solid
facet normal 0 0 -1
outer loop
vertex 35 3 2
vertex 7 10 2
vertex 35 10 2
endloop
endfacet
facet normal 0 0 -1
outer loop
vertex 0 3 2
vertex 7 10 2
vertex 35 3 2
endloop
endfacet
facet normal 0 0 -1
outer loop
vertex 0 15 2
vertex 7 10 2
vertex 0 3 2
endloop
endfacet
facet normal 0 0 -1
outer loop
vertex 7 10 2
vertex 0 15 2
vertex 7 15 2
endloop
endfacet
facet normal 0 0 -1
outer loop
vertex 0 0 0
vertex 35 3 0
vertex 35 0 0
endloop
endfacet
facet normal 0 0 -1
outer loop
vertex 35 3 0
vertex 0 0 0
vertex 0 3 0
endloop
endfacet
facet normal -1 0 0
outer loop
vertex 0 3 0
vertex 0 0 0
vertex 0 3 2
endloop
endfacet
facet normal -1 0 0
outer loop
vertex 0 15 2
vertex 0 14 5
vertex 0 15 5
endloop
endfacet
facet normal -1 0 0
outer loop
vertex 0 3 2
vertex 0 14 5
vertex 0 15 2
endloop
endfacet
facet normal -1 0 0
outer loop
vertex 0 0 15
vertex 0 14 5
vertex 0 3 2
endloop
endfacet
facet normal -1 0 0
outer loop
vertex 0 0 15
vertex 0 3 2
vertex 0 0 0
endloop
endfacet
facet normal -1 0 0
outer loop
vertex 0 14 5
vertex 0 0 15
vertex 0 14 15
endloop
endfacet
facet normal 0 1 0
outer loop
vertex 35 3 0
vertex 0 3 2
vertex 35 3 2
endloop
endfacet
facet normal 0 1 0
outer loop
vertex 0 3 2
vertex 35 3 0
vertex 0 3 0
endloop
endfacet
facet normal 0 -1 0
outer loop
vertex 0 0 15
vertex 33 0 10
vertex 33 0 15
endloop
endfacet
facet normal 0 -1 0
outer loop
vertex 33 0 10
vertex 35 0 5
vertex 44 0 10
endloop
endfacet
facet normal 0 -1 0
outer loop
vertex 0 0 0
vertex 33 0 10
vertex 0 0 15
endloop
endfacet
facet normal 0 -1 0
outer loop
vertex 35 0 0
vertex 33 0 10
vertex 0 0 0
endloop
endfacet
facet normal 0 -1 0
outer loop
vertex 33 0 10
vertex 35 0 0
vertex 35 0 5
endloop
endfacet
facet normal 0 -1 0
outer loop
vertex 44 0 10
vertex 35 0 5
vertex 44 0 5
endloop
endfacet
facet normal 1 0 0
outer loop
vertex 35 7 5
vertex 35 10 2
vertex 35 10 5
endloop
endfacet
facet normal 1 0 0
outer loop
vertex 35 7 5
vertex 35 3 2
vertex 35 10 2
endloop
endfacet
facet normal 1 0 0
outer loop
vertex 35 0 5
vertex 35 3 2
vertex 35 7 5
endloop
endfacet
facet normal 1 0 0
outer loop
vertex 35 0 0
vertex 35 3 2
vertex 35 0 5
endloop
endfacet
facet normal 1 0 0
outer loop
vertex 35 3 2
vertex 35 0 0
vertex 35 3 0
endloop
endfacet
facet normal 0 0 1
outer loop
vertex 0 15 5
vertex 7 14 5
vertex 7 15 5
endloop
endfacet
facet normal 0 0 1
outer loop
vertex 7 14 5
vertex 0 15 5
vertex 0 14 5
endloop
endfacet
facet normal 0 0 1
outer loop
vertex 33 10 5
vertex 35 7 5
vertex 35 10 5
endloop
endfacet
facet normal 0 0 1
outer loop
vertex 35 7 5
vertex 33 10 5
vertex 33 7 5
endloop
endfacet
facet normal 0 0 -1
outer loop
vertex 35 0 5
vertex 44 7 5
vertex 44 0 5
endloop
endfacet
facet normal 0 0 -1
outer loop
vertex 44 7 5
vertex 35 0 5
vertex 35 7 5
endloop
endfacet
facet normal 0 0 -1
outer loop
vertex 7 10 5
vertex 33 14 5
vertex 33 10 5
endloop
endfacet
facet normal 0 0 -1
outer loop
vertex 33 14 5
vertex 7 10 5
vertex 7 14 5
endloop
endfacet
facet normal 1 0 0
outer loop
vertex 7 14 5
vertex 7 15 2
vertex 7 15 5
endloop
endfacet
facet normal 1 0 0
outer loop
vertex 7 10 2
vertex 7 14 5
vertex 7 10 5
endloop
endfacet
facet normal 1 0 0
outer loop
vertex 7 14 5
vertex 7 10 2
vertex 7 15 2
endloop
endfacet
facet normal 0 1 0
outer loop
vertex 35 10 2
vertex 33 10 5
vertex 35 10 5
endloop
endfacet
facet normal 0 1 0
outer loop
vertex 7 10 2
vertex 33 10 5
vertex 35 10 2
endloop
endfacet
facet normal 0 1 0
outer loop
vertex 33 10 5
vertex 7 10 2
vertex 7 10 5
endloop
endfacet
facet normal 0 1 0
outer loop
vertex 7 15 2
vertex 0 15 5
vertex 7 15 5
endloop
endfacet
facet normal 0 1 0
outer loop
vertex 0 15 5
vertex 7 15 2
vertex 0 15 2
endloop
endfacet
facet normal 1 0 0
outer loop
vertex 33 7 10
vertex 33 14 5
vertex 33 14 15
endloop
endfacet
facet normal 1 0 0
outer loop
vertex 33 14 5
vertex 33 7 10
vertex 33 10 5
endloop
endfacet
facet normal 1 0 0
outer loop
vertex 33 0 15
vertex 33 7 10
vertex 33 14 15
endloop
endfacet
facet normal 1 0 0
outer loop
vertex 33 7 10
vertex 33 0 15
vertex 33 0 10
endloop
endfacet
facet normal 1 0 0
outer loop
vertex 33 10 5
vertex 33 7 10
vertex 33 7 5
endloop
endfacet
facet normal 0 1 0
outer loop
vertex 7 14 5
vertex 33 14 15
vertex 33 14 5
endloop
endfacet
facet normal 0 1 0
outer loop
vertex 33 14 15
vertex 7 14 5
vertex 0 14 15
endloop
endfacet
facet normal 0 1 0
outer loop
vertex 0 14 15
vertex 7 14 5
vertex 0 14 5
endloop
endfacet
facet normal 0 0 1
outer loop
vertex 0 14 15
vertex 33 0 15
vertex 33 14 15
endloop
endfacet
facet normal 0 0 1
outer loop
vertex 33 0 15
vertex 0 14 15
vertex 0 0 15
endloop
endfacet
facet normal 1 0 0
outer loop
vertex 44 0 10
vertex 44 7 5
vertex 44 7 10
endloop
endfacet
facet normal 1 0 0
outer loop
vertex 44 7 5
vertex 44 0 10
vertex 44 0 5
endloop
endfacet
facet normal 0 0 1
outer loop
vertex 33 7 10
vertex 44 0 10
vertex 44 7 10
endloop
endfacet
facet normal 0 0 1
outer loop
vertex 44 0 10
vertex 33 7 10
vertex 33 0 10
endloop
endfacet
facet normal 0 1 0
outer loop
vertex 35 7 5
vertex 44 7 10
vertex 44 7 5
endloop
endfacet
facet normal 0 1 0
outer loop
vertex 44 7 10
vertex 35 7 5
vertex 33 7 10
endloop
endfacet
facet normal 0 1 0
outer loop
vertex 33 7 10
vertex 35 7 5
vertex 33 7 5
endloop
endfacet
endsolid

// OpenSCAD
translate([2.5, 1.5, 1.0]) color([0.43401891336511733, 0.7163457448050065, 0.3841301513333275]) cube([5, 3, 2], center=true);
translate([7.5, 1.5, 1.0]) color([0.33069552050314754, 0.6480049557775331, 0.6874717059379091]) cube([5, 3, 2], center=true);
translate([12.5, 1.5, 1.0]) color([0.14801928734251768, 0.93323205939552, 0.14750072005511716]) cube([5, 3, 2], center=true);
translate([17.5, 1.5, 1.0]) color([0.31607169754224296, 0.2088660889148145, 0.1868244368145192]) cube([5, 3, 2], center=true);
translate([22.5, 1.5, 1.0]) color([0.3491672112743387, 0.9834841816788549, 0.427290207198605]) cube([5, 3, 2], center=true);
translate([27.5, 1.5, 1.0]) color([0.49195852420878716, 0.7297831417632067, 0.7955834433152874]) cube([5, 3, 2], center=true);
translate([32.5, 1.5, 1.0]) color([0.43927203819181504, 0.2042687131951023, 0.709997013582239]) cube([5, 3, 2], center=true);
translate([3.5, 2.5, 3.5]) color([0.9058221085991531, 0.03327924187503195, 0.6331757983912308]) cube([7, 5, 3], center=true);
translate([10.5, 2.5, 3.5]) color([0.8710093735661795, 0.3636101637556439, 0.7431628081058981]) cube([7, 5, 3], center=true);
translate([17.5, 2.5, 3.5]) color([0.6774926049513658, 0.23306417175218364, 0.2975271762349214]) cube([7, 5, 3], center=true);
translate([24.5, 2.5, 3.5]) color([0.0866296567389645, 0.8688435220131177, 0.7514921149941085]) cube([7, 5, 3], center=true);
translate([31.5, 2.5, 3.5]) color([0.7714305883456576, 0.8829516943772963, 0.4114323292545551]) cube([7, 5, 3], center=true);
translate([3.5, 7.5, 3.5]) color([0.05394001775890156, 0.696805048854085, 0.6656296547984208]) cube([7, 5, 3], center=true);
translate([10.5, 7.5, 3.5]) color([0.6485122289860075, 0.5471816206705559, 0.7344166333532061]) cube([7, 5, 3], center=true);
translate([17.5, 7.5, 3.5]) color([0.4306045068871984, 0.45460236437769275, 0.25475221651879554]) cube([7, 5, 3], center=true);
translate([24.5, 7.5, 3.5]) color([0.47565246533915095, 0.3371942584654095, 0.04223511400675217]) cube([7, 5, 3], center=true);
translate([31.5, 7.5, 3.5]) color([0.05255331220371673, 0.34980223330761895, 0.2898096938030986]) cube([7, 5, 3], center=true);
translate([3.5, 12.5, 3.5]) color([0.007130057665757694, 0.06369015415518986, 0.42774457246440645]) cube([7, 5, 3], center=true);
translate([5.5, 3.5, 7.5]) color([0.22216650821772055, 0.6086379170158094, 0.557768500755667]) cube([11, 7, 5], center=true);
translate([16.5, 3.5, 7.5]) color([0.22097295115667703, 0.19284823789822858, 0.6083188139076446]) cube([11, 7, 5], center=true);
translate([27.5, 3.5, 7.5]) color([0.606354511401297, 0.08562053587131313, 0.31903016062772993]) cube([11, 7, 5], center=true);
translate([5.5, 10.5, 7.5]) color([0.53590115499306, 0.8934753784920533, 0.25549985489866966]) cube([11, 7, 5], center=true);
translate([16.5, 10.5, 7.5]) color([0.5219903070058861, 0.1901317713313112, 0.08011594570868696]) cube([11, 7, 5], center=true);
translate([27.5, 10.5, 7.5]) color([0.8699478397109702, 0.3457472114844995, 0.837290862214726]) cube([11, 7, 5], center=true);
translate([5.5, 3.5, 12.5]) color([0.25127706432840136, 0.7290260027021367, 0.3013213449137814]) cube([11, 7, 5], center=true);
translate([16.5, 3.5, 12.5]) color([0.5169005458056509, 0.38467176448284957, 0.4820846642847386]) cube([11, 7, 5], center=true);
translate([27.5, 3.5, 12.5]) color([0.8719757028853922, 0.2399620044566907, 0.3058147052987177]) cube([11, 7, 5], center=true);
translate([5.5, 10.5, 12.5]) color([0.5519737755681405, 0.009208459116004764, 0.4953005367860557]) cube([11, 7, 5], center=true);
translate([16.5, 10.5, 12.5]) color([0.43819859659275806, 0.9171481192782721, 0.41212019308576986]) cube([11, 7, 5], center=true);
translate([27.5, 10.5, 12.5]) color([0.49358197644734136, 0.44010860560926524, 0.0856157398333921]) cube([11, 7, 5], center=true);
translate([38.5, 3.5, 7.5]) color([0.2411443971002879, 0.8262650576639278, 0.15379567752788093]) cube([11, 7, 5], center=true);
